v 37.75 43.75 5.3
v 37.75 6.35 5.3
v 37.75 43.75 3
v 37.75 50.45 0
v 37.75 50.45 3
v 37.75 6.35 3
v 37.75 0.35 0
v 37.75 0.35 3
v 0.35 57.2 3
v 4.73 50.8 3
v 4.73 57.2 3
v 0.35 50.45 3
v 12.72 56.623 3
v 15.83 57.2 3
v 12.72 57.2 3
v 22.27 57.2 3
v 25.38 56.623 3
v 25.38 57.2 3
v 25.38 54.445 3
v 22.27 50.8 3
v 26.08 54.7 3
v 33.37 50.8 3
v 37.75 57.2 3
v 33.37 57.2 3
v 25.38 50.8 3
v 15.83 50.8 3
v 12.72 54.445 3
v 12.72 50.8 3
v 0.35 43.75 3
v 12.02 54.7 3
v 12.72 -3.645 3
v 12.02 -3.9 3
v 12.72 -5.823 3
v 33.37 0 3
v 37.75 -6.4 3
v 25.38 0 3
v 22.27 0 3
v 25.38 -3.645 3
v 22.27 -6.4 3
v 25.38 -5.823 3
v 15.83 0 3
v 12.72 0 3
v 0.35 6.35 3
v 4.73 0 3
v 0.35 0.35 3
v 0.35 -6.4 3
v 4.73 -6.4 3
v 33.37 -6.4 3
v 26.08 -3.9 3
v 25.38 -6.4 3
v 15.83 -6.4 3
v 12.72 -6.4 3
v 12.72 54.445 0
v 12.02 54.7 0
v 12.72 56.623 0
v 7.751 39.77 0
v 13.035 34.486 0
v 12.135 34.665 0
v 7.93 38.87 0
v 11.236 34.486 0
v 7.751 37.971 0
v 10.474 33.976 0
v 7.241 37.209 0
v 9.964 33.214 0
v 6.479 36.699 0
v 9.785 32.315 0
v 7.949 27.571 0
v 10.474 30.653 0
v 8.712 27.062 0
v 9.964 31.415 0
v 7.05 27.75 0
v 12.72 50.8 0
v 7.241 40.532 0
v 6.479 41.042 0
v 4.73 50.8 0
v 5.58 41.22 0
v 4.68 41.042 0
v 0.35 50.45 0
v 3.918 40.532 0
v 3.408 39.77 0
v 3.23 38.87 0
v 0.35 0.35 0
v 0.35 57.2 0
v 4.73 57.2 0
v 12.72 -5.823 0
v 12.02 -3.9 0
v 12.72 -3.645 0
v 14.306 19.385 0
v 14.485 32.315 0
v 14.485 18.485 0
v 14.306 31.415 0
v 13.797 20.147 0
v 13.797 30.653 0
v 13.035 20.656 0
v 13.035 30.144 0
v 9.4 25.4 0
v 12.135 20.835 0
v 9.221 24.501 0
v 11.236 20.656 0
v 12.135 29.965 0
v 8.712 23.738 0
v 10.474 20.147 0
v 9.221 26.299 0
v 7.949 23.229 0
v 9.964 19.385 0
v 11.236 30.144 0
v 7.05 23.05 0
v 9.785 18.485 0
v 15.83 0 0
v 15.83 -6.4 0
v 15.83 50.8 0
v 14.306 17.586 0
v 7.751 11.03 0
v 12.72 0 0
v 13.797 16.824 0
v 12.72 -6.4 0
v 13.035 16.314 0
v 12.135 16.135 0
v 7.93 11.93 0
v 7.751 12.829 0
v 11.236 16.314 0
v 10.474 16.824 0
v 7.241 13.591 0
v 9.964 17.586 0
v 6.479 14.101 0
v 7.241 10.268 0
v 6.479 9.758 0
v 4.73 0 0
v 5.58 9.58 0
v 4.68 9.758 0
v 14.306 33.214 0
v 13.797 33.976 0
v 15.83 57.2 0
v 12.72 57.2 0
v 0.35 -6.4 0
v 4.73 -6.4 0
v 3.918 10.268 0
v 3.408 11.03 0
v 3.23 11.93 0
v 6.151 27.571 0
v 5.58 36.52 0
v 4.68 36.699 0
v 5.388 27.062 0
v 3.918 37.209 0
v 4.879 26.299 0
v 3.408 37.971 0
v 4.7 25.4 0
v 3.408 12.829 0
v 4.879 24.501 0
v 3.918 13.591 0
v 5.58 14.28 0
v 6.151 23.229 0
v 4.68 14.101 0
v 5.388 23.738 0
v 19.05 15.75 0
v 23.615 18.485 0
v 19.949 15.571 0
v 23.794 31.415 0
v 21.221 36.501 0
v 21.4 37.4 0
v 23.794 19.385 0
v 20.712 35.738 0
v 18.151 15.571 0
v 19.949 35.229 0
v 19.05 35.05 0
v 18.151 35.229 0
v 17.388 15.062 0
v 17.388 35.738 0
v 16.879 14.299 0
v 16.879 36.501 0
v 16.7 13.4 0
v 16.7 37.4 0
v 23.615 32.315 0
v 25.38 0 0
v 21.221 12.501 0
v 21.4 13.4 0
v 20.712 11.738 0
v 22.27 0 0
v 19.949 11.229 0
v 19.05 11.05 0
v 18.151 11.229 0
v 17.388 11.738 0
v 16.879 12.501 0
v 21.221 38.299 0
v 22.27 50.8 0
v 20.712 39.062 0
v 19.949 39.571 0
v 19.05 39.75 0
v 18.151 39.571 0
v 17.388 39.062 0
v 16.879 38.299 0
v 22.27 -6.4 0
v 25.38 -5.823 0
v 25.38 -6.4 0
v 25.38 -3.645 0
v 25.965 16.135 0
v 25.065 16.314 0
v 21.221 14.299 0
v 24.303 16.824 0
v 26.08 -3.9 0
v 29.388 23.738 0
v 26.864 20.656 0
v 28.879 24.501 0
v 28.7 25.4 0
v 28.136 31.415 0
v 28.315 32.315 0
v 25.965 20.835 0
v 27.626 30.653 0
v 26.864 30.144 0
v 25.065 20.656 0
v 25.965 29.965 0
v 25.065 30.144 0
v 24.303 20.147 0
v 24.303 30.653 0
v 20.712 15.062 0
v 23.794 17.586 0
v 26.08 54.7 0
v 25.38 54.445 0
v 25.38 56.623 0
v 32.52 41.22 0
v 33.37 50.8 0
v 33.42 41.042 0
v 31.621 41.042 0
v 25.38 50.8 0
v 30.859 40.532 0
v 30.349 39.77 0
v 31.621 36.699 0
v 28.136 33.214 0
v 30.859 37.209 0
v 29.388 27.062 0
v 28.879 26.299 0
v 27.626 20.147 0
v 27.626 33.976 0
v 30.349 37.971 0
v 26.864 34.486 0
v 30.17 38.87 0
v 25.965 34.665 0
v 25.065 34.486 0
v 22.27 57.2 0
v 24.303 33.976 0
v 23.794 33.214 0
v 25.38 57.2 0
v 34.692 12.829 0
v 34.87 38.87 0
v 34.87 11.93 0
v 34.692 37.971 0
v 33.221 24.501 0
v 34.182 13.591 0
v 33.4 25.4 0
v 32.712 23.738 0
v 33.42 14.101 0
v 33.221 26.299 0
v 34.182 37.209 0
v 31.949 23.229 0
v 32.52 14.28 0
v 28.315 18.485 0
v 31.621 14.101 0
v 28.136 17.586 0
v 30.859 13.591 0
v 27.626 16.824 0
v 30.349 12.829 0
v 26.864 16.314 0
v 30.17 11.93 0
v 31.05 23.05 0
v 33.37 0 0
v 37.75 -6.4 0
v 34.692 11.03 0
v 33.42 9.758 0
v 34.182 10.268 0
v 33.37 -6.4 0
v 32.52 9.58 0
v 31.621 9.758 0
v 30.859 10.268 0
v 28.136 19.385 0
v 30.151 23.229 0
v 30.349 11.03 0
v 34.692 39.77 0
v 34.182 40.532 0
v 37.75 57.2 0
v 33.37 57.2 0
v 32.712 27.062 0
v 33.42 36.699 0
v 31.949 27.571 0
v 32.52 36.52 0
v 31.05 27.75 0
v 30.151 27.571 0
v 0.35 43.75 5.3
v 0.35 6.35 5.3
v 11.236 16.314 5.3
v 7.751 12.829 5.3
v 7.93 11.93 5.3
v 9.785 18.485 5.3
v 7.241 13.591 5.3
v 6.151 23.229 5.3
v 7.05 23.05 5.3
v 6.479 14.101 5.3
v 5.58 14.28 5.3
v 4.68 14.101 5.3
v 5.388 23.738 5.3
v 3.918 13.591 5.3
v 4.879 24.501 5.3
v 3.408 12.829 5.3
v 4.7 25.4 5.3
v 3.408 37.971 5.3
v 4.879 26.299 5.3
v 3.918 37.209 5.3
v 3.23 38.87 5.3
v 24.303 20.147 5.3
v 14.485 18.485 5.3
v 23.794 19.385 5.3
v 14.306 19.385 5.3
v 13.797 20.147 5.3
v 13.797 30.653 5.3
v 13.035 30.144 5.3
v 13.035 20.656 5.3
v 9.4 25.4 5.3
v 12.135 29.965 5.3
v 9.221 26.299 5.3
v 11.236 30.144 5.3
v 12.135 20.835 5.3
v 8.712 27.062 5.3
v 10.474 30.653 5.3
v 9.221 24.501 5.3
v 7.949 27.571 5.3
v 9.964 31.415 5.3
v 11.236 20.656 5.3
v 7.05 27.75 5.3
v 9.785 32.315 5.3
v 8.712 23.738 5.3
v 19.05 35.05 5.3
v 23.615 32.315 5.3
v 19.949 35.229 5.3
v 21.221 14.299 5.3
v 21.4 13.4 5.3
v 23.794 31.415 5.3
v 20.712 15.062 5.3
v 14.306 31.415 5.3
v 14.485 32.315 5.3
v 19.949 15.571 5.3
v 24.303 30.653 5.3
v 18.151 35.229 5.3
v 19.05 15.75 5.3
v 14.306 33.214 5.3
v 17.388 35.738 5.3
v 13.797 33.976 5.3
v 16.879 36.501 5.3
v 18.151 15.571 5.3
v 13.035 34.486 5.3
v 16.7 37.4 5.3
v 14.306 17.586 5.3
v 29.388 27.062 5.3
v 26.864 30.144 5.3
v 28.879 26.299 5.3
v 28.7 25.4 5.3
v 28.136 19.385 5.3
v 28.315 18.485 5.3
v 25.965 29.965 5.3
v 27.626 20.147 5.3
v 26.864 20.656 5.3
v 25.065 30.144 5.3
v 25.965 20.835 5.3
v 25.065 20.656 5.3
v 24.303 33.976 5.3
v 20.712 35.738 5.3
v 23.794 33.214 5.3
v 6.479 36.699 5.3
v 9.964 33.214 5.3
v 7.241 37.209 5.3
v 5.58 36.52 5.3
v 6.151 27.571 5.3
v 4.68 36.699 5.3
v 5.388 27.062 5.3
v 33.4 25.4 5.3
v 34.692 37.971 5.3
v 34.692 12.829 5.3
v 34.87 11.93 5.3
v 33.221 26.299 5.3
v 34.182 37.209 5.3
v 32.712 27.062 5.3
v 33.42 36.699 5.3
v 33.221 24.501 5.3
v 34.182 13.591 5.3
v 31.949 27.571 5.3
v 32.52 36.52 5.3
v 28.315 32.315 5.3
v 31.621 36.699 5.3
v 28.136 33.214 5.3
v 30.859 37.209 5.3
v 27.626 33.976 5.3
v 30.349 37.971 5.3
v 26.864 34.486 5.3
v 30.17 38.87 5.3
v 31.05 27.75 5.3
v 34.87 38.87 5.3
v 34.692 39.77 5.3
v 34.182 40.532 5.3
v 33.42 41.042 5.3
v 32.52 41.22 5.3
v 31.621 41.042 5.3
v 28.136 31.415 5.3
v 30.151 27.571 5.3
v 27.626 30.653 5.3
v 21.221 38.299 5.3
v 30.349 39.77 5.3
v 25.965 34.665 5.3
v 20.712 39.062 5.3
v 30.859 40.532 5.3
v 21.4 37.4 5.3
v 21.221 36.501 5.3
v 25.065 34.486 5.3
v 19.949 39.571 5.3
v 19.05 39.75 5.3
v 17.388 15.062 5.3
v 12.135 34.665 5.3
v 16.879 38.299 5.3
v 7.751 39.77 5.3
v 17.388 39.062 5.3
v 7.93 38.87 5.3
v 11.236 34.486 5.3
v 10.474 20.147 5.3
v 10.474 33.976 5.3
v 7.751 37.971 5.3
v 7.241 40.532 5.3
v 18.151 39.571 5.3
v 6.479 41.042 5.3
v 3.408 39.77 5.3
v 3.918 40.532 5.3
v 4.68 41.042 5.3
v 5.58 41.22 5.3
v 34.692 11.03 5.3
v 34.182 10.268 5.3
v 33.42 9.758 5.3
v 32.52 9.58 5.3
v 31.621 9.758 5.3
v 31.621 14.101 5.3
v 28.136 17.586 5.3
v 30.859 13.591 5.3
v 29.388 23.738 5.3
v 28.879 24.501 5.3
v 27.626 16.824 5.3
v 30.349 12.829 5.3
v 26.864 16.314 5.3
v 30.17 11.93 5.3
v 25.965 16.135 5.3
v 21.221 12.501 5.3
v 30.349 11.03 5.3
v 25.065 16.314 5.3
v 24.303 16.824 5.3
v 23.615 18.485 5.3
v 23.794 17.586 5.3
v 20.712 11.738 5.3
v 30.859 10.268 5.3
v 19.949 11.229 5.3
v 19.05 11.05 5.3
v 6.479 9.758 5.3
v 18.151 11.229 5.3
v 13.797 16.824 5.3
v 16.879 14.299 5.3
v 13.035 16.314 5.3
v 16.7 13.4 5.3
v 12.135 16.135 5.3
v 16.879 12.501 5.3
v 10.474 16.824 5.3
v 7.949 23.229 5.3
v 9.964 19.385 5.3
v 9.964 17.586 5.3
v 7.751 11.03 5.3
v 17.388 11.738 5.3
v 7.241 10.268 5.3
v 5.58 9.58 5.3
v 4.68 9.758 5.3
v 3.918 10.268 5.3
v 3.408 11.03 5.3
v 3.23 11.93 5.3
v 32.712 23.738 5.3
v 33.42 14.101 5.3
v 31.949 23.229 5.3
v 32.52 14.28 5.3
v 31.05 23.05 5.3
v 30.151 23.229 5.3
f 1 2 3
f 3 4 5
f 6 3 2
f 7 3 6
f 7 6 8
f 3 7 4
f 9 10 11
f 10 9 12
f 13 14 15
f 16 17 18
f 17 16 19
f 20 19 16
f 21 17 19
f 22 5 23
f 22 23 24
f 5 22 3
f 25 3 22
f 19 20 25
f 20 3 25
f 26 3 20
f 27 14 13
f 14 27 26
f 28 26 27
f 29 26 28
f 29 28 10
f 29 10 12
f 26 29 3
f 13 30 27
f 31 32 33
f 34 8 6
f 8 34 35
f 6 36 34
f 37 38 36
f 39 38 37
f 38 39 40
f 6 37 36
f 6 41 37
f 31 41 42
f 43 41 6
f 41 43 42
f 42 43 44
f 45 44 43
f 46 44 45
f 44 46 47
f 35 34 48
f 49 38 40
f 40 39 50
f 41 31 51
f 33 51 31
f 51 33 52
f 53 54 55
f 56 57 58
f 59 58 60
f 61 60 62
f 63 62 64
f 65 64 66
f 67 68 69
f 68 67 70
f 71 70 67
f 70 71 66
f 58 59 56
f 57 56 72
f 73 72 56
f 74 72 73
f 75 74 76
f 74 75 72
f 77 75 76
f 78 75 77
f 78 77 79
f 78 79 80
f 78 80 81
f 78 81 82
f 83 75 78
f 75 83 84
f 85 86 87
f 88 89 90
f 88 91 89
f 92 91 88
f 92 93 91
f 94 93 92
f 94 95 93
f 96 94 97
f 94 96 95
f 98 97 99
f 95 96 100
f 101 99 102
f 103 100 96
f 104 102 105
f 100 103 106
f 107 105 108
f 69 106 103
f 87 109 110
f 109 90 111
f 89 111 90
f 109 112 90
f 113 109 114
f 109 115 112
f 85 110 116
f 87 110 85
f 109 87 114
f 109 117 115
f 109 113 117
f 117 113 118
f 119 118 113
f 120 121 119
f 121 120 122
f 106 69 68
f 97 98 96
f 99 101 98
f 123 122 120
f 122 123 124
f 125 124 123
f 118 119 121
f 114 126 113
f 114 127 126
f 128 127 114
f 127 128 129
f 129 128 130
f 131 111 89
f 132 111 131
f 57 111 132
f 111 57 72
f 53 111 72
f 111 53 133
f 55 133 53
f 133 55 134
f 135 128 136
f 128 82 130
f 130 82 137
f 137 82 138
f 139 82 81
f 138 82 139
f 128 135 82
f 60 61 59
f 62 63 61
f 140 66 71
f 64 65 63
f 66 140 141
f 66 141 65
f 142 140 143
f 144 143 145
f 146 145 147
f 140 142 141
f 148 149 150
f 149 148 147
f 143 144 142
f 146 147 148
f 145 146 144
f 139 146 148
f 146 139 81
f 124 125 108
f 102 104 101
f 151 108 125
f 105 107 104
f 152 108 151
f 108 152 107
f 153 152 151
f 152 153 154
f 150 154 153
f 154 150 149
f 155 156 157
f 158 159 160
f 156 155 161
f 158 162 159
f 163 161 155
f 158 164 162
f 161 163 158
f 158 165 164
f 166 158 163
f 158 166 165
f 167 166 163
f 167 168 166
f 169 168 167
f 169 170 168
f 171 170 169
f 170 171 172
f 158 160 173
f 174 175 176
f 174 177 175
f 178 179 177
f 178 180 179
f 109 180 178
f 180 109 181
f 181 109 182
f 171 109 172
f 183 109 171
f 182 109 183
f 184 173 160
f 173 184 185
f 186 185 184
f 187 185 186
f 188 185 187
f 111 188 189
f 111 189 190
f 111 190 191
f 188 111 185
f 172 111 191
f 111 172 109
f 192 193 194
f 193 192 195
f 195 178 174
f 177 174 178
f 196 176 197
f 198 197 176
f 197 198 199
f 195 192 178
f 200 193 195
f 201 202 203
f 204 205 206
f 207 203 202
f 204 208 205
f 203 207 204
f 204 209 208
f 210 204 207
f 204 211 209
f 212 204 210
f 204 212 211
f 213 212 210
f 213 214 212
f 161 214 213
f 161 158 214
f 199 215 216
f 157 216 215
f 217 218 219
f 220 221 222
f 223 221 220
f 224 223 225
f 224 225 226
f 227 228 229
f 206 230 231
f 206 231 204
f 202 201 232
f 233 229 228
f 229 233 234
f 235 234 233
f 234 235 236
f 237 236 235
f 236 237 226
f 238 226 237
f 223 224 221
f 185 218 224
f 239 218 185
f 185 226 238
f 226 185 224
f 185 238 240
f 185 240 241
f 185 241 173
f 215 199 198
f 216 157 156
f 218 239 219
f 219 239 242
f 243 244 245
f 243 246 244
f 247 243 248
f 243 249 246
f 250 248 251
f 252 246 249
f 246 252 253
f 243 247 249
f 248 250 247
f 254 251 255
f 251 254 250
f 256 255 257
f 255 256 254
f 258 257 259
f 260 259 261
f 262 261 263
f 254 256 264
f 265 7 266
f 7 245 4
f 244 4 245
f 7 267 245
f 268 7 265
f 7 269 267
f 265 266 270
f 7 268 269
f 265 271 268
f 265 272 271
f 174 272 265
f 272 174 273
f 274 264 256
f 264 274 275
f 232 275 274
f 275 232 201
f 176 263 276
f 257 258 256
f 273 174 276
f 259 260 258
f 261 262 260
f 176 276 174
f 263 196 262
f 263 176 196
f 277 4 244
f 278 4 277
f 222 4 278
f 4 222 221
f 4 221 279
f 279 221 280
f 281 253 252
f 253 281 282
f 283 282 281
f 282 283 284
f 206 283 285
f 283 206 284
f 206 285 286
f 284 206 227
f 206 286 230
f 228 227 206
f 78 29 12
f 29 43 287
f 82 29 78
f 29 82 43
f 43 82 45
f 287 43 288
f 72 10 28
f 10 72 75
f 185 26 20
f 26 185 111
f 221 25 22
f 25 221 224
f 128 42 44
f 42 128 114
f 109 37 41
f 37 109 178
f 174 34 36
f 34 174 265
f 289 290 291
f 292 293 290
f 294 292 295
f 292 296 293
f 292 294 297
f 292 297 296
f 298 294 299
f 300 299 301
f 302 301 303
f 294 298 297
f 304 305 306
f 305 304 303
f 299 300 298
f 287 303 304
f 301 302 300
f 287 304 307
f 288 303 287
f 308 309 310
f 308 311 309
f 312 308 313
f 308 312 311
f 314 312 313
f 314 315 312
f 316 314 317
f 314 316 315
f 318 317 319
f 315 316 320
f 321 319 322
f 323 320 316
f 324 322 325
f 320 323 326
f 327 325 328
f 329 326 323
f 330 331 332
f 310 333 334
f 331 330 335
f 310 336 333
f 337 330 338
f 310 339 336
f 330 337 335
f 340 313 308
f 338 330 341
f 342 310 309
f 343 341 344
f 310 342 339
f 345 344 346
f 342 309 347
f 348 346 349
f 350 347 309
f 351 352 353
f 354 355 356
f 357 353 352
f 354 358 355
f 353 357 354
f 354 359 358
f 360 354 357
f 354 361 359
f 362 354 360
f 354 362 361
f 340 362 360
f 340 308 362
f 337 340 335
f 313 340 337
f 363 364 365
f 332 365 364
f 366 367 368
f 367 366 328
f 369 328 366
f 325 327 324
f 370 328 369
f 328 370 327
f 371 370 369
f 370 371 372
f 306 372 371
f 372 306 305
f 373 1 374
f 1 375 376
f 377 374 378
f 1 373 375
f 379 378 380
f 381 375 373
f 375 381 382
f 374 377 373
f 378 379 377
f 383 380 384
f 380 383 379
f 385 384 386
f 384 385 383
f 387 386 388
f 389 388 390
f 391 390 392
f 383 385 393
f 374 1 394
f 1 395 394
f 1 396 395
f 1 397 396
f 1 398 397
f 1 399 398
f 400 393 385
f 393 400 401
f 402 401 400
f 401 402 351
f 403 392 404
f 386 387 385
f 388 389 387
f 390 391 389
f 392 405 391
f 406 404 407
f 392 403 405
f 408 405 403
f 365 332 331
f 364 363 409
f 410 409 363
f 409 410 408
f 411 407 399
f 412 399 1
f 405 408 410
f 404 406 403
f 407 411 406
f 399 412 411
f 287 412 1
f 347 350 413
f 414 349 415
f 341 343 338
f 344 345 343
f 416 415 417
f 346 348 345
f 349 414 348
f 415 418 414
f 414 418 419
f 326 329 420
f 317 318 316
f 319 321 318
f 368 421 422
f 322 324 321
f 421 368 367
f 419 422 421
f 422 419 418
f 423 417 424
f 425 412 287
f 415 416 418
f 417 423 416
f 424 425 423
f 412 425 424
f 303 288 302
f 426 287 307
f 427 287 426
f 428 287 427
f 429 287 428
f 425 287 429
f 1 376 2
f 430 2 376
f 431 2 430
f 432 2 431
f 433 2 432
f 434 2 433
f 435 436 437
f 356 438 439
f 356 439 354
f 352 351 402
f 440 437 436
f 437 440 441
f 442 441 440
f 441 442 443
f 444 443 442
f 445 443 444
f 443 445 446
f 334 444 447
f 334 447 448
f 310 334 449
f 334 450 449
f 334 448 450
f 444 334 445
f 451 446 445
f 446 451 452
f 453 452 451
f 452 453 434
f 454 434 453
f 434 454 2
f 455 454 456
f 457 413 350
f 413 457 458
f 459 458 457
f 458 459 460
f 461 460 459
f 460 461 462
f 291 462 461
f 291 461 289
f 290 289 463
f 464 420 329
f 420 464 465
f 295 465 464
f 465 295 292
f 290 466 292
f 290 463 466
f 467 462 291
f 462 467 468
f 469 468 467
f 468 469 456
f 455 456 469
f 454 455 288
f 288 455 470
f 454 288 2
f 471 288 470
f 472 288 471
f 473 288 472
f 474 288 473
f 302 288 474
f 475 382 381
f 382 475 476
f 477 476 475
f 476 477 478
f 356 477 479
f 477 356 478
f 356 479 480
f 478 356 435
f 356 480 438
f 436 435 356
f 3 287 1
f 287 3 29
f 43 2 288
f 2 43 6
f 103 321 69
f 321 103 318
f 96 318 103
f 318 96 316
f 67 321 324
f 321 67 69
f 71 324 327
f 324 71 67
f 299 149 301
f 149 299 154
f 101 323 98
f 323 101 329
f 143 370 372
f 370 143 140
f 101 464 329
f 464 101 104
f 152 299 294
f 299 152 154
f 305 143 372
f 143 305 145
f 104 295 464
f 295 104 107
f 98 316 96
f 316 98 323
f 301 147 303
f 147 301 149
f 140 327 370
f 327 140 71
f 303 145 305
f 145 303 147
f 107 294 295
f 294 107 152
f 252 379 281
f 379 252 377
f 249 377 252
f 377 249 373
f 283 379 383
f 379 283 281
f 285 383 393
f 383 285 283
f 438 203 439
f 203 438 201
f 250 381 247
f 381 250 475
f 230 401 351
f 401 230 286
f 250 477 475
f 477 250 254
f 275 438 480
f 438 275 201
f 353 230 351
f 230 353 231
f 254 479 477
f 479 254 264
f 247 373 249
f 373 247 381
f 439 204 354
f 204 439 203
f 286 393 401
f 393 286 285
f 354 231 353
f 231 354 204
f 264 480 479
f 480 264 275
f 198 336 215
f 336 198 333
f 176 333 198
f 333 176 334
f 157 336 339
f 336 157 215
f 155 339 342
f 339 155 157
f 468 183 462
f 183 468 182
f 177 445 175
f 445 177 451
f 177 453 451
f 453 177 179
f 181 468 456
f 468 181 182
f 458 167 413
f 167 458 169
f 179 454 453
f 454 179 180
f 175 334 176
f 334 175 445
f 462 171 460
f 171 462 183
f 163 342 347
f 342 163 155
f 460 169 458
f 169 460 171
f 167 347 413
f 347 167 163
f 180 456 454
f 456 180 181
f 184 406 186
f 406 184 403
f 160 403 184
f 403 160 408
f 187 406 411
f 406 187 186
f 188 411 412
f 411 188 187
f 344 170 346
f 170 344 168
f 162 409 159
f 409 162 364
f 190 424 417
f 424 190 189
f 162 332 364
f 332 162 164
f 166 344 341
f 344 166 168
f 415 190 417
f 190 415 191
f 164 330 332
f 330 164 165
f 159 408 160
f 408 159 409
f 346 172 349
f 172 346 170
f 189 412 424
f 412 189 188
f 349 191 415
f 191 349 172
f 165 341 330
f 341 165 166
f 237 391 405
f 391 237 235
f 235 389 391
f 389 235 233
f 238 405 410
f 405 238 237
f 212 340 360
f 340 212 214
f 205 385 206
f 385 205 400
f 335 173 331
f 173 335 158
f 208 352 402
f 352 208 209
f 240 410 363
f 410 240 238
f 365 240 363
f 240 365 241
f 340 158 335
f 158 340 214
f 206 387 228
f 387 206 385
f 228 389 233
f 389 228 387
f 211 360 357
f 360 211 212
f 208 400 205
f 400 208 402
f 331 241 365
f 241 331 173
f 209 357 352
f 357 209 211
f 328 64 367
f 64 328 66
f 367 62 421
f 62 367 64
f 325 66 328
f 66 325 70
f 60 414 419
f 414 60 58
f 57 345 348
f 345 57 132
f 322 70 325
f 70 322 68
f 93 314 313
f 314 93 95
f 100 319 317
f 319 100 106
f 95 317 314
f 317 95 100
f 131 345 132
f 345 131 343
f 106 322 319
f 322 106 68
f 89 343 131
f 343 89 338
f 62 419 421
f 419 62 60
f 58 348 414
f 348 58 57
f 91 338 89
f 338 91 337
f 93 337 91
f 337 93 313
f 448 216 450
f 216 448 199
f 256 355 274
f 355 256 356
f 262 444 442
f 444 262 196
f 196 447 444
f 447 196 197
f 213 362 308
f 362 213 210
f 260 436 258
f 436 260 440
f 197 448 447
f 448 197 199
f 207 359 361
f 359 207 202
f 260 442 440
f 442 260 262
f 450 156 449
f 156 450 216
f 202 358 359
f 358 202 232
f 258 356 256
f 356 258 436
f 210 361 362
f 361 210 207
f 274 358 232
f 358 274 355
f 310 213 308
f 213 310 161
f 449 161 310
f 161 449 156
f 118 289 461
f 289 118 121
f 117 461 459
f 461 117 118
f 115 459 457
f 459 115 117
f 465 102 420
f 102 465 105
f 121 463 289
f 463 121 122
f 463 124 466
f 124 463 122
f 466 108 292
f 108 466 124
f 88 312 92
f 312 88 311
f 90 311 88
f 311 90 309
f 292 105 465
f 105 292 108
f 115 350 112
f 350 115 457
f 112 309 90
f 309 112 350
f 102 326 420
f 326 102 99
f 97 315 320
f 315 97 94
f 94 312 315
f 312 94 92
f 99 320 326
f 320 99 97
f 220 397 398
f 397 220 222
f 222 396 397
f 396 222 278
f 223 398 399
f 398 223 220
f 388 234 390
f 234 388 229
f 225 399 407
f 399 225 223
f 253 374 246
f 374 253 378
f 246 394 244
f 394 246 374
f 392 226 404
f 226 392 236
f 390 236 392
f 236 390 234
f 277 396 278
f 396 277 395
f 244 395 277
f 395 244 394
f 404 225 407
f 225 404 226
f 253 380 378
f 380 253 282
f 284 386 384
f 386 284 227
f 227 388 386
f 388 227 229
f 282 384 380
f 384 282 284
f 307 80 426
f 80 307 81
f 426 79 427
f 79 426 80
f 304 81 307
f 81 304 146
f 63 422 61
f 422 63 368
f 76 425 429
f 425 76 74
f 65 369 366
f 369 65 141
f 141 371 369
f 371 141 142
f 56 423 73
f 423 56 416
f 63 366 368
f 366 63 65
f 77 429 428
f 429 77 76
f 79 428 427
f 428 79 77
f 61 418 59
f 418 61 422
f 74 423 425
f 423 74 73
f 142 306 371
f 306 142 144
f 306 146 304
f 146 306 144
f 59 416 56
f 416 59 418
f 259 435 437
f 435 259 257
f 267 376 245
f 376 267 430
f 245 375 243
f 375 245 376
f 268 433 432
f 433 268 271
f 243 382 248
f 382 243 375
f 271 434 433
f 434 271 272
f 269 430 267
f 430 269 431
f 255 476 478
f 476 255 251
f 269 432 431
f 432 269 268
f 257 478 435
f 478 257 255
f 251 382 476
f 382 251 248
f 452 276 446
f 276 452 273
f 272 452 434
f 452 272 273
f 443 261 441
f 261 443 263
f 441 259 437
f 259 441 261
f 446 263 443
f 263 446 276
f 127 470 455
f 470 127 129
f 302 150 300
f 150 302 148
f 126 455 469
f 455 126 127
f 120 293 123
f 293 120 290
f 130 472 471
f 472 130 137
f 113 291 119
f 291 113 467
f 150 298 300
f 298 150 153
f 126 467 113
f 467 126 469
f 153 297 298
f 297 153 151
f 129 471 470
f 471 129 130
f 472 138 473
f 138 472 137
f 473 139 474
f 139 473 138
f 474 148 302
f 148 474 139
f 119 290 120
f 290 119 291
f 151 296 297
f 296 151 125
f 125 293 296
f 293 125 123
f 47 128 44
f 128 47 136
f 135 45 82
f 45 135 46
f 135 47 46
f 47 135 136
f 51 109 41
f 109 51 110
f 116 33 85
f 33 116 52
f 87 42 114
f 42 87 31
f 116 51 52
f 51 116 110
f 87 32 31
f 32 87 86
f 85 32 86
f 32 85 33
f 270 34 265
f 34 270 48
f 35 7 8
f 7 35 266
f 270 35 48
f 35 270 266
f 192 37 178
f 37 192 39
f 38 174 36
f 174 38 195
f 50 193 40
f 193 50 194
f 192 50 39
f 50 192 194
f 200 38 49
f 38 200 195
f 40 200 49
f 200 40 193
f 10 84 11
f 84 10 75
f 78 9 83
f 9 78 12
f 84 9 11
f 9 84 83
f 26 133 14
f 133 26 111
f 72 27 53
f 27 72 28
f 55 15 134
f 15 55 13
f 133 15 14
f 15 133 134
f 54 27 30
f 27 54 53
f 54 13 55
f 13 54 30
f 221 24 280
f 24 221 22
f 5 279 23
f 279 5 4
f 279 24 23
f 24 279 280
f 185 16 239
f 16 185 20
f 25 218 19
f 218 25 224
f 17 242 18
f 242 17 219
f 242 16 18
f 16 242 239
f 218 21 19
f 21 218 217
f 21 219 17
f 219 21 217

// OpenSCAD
// in inches, distance between clips
base_length=2.0; //[1.5:0.25:4.5]

// in mm, extra spacing for slots/tabs
xy_tolerance=0.35; //[0.1:0.05:1.0]

// preview[view:south, tilt:top]

/* [Hidden] */
i2m=25.4; // inches to mm
rHole=2.35; //mm


// central block for mount, with holes
difference() {
    
translate([xy_tolerance,0,0]){
cube([1.5*i2m - 2*xy_tolerance, base_length*i2m, 3]);
    translate([0,(base_length/2-0.75)*i2m,0])
cube([1.5*i2m - 2*xy_tolerance, 1.5*i2m - 2*xy_tolerance, 5.3]);
}
    
    // gobilda holes
    translate([0.75*i2m - 12, base_length*i2m/2, -2])
    cylinder(h=10, r=rHole, $fn=16);
    translate([0.75*i2m + 12, base_length*i2m/2, -2])
    cylinder(h=10, r=rHole, $fn=16);
    translate([0.75*i2m , base_length*i2m/2 -12, -2])
    cylinder(h=10, r=rHole, $fn=16);
    translate([0.75*i2m, base_length*i2m/2 +12, -2])
    cylinder(h=10, r=rHole, $fn=16);
    
    // actobotics inner holes
    translate([0.75*i2m, base_length*i2m/2, -2])
    rotate(45)
    translate([0.77/2*i2m, 0, -2])
    cylinder(h=10, r=rHole, $fn=16);
    
    translate([0.75*i2m, base_length*i2m/2, -2])
    rotate(135)
    translate([0.77/2*i2m, 0, -2])
    cylinder(h=10, r=rHole, $fn=16);
    
    translate([0.75*i2m, base_length*i2m/2, -2])
    rotate(-45)
    translate([0.77/2*i2m, 0, -2])
    cylinder(h=10, r=rHole, $fn=16);
    
    translate([0.75*i2m, base_length*i2m/2, -2])
    rotate(-135)
    translate([0.77/2*i2m, 0, -2])
    cylinder(h=10, r=rHole, $fn=16);
    
    // actobotics outer holes
    translate([0.75*i2m, base_length*i2m/2, -2])
    rotate(45)
    translate([0.75*i2m, 0, -2])
    cylinder(h=10, r=rHole, $fn=16);
    
    translate([0.75*i2m, base_length*i2m/2, -2])
    rotate(135)
    translate([0.75*i2m, 0, -2])
    cylinder(h=10, r=rHole, $fn=16);
    
    translate([0.75*i2m, base_length*i2m/2, -2])
    rotate(-45)
    translate([0.75*i2m, 0, -2])
    cylinder(h=10, r=rHole, $fn=16);
    
    translate([0.75*i2m, base_length*i2m/2, -2])
    rotate(-135)
    translate([0.75*i2m, 0, -2])
    cylinder(h=10, r=rHole, $fn=16);
}

tabs();

translate([0,base_length*i2m,0])
rotate(180)
mirror([1,0,0])
tabs();


    
 module tabs() {
     
    halfTabs();
    
    translate([1.5*i2m,0,0])
    mirror([1,0,0]) 
    halfTabs();
}

module halfTabs() {

    translate([0,-2*3.2,0])
    translate([xy_tolerance,0,0])
    cube([.2*i2m -2*xy_tolerance,2*3.2+xy_tolerance, 3]);
    
    translate([0.75*i2m-13.36/2,-2*3.2,0])
    translate([xy_tolerance,0,0])
    cube([.15*i2m -2*xy_tolerance,2*3.2+xy_tolerance, 3]);
    
    translate([0.75*i2m-13.36/2-0.7,-3.2-0.7,0])
    translate([xy_tolerance,0,0])
    rotate(-70)
    cube([.13*i2m -2*xy_tolerance,1.2+xy_tolerance, 3]);
}
